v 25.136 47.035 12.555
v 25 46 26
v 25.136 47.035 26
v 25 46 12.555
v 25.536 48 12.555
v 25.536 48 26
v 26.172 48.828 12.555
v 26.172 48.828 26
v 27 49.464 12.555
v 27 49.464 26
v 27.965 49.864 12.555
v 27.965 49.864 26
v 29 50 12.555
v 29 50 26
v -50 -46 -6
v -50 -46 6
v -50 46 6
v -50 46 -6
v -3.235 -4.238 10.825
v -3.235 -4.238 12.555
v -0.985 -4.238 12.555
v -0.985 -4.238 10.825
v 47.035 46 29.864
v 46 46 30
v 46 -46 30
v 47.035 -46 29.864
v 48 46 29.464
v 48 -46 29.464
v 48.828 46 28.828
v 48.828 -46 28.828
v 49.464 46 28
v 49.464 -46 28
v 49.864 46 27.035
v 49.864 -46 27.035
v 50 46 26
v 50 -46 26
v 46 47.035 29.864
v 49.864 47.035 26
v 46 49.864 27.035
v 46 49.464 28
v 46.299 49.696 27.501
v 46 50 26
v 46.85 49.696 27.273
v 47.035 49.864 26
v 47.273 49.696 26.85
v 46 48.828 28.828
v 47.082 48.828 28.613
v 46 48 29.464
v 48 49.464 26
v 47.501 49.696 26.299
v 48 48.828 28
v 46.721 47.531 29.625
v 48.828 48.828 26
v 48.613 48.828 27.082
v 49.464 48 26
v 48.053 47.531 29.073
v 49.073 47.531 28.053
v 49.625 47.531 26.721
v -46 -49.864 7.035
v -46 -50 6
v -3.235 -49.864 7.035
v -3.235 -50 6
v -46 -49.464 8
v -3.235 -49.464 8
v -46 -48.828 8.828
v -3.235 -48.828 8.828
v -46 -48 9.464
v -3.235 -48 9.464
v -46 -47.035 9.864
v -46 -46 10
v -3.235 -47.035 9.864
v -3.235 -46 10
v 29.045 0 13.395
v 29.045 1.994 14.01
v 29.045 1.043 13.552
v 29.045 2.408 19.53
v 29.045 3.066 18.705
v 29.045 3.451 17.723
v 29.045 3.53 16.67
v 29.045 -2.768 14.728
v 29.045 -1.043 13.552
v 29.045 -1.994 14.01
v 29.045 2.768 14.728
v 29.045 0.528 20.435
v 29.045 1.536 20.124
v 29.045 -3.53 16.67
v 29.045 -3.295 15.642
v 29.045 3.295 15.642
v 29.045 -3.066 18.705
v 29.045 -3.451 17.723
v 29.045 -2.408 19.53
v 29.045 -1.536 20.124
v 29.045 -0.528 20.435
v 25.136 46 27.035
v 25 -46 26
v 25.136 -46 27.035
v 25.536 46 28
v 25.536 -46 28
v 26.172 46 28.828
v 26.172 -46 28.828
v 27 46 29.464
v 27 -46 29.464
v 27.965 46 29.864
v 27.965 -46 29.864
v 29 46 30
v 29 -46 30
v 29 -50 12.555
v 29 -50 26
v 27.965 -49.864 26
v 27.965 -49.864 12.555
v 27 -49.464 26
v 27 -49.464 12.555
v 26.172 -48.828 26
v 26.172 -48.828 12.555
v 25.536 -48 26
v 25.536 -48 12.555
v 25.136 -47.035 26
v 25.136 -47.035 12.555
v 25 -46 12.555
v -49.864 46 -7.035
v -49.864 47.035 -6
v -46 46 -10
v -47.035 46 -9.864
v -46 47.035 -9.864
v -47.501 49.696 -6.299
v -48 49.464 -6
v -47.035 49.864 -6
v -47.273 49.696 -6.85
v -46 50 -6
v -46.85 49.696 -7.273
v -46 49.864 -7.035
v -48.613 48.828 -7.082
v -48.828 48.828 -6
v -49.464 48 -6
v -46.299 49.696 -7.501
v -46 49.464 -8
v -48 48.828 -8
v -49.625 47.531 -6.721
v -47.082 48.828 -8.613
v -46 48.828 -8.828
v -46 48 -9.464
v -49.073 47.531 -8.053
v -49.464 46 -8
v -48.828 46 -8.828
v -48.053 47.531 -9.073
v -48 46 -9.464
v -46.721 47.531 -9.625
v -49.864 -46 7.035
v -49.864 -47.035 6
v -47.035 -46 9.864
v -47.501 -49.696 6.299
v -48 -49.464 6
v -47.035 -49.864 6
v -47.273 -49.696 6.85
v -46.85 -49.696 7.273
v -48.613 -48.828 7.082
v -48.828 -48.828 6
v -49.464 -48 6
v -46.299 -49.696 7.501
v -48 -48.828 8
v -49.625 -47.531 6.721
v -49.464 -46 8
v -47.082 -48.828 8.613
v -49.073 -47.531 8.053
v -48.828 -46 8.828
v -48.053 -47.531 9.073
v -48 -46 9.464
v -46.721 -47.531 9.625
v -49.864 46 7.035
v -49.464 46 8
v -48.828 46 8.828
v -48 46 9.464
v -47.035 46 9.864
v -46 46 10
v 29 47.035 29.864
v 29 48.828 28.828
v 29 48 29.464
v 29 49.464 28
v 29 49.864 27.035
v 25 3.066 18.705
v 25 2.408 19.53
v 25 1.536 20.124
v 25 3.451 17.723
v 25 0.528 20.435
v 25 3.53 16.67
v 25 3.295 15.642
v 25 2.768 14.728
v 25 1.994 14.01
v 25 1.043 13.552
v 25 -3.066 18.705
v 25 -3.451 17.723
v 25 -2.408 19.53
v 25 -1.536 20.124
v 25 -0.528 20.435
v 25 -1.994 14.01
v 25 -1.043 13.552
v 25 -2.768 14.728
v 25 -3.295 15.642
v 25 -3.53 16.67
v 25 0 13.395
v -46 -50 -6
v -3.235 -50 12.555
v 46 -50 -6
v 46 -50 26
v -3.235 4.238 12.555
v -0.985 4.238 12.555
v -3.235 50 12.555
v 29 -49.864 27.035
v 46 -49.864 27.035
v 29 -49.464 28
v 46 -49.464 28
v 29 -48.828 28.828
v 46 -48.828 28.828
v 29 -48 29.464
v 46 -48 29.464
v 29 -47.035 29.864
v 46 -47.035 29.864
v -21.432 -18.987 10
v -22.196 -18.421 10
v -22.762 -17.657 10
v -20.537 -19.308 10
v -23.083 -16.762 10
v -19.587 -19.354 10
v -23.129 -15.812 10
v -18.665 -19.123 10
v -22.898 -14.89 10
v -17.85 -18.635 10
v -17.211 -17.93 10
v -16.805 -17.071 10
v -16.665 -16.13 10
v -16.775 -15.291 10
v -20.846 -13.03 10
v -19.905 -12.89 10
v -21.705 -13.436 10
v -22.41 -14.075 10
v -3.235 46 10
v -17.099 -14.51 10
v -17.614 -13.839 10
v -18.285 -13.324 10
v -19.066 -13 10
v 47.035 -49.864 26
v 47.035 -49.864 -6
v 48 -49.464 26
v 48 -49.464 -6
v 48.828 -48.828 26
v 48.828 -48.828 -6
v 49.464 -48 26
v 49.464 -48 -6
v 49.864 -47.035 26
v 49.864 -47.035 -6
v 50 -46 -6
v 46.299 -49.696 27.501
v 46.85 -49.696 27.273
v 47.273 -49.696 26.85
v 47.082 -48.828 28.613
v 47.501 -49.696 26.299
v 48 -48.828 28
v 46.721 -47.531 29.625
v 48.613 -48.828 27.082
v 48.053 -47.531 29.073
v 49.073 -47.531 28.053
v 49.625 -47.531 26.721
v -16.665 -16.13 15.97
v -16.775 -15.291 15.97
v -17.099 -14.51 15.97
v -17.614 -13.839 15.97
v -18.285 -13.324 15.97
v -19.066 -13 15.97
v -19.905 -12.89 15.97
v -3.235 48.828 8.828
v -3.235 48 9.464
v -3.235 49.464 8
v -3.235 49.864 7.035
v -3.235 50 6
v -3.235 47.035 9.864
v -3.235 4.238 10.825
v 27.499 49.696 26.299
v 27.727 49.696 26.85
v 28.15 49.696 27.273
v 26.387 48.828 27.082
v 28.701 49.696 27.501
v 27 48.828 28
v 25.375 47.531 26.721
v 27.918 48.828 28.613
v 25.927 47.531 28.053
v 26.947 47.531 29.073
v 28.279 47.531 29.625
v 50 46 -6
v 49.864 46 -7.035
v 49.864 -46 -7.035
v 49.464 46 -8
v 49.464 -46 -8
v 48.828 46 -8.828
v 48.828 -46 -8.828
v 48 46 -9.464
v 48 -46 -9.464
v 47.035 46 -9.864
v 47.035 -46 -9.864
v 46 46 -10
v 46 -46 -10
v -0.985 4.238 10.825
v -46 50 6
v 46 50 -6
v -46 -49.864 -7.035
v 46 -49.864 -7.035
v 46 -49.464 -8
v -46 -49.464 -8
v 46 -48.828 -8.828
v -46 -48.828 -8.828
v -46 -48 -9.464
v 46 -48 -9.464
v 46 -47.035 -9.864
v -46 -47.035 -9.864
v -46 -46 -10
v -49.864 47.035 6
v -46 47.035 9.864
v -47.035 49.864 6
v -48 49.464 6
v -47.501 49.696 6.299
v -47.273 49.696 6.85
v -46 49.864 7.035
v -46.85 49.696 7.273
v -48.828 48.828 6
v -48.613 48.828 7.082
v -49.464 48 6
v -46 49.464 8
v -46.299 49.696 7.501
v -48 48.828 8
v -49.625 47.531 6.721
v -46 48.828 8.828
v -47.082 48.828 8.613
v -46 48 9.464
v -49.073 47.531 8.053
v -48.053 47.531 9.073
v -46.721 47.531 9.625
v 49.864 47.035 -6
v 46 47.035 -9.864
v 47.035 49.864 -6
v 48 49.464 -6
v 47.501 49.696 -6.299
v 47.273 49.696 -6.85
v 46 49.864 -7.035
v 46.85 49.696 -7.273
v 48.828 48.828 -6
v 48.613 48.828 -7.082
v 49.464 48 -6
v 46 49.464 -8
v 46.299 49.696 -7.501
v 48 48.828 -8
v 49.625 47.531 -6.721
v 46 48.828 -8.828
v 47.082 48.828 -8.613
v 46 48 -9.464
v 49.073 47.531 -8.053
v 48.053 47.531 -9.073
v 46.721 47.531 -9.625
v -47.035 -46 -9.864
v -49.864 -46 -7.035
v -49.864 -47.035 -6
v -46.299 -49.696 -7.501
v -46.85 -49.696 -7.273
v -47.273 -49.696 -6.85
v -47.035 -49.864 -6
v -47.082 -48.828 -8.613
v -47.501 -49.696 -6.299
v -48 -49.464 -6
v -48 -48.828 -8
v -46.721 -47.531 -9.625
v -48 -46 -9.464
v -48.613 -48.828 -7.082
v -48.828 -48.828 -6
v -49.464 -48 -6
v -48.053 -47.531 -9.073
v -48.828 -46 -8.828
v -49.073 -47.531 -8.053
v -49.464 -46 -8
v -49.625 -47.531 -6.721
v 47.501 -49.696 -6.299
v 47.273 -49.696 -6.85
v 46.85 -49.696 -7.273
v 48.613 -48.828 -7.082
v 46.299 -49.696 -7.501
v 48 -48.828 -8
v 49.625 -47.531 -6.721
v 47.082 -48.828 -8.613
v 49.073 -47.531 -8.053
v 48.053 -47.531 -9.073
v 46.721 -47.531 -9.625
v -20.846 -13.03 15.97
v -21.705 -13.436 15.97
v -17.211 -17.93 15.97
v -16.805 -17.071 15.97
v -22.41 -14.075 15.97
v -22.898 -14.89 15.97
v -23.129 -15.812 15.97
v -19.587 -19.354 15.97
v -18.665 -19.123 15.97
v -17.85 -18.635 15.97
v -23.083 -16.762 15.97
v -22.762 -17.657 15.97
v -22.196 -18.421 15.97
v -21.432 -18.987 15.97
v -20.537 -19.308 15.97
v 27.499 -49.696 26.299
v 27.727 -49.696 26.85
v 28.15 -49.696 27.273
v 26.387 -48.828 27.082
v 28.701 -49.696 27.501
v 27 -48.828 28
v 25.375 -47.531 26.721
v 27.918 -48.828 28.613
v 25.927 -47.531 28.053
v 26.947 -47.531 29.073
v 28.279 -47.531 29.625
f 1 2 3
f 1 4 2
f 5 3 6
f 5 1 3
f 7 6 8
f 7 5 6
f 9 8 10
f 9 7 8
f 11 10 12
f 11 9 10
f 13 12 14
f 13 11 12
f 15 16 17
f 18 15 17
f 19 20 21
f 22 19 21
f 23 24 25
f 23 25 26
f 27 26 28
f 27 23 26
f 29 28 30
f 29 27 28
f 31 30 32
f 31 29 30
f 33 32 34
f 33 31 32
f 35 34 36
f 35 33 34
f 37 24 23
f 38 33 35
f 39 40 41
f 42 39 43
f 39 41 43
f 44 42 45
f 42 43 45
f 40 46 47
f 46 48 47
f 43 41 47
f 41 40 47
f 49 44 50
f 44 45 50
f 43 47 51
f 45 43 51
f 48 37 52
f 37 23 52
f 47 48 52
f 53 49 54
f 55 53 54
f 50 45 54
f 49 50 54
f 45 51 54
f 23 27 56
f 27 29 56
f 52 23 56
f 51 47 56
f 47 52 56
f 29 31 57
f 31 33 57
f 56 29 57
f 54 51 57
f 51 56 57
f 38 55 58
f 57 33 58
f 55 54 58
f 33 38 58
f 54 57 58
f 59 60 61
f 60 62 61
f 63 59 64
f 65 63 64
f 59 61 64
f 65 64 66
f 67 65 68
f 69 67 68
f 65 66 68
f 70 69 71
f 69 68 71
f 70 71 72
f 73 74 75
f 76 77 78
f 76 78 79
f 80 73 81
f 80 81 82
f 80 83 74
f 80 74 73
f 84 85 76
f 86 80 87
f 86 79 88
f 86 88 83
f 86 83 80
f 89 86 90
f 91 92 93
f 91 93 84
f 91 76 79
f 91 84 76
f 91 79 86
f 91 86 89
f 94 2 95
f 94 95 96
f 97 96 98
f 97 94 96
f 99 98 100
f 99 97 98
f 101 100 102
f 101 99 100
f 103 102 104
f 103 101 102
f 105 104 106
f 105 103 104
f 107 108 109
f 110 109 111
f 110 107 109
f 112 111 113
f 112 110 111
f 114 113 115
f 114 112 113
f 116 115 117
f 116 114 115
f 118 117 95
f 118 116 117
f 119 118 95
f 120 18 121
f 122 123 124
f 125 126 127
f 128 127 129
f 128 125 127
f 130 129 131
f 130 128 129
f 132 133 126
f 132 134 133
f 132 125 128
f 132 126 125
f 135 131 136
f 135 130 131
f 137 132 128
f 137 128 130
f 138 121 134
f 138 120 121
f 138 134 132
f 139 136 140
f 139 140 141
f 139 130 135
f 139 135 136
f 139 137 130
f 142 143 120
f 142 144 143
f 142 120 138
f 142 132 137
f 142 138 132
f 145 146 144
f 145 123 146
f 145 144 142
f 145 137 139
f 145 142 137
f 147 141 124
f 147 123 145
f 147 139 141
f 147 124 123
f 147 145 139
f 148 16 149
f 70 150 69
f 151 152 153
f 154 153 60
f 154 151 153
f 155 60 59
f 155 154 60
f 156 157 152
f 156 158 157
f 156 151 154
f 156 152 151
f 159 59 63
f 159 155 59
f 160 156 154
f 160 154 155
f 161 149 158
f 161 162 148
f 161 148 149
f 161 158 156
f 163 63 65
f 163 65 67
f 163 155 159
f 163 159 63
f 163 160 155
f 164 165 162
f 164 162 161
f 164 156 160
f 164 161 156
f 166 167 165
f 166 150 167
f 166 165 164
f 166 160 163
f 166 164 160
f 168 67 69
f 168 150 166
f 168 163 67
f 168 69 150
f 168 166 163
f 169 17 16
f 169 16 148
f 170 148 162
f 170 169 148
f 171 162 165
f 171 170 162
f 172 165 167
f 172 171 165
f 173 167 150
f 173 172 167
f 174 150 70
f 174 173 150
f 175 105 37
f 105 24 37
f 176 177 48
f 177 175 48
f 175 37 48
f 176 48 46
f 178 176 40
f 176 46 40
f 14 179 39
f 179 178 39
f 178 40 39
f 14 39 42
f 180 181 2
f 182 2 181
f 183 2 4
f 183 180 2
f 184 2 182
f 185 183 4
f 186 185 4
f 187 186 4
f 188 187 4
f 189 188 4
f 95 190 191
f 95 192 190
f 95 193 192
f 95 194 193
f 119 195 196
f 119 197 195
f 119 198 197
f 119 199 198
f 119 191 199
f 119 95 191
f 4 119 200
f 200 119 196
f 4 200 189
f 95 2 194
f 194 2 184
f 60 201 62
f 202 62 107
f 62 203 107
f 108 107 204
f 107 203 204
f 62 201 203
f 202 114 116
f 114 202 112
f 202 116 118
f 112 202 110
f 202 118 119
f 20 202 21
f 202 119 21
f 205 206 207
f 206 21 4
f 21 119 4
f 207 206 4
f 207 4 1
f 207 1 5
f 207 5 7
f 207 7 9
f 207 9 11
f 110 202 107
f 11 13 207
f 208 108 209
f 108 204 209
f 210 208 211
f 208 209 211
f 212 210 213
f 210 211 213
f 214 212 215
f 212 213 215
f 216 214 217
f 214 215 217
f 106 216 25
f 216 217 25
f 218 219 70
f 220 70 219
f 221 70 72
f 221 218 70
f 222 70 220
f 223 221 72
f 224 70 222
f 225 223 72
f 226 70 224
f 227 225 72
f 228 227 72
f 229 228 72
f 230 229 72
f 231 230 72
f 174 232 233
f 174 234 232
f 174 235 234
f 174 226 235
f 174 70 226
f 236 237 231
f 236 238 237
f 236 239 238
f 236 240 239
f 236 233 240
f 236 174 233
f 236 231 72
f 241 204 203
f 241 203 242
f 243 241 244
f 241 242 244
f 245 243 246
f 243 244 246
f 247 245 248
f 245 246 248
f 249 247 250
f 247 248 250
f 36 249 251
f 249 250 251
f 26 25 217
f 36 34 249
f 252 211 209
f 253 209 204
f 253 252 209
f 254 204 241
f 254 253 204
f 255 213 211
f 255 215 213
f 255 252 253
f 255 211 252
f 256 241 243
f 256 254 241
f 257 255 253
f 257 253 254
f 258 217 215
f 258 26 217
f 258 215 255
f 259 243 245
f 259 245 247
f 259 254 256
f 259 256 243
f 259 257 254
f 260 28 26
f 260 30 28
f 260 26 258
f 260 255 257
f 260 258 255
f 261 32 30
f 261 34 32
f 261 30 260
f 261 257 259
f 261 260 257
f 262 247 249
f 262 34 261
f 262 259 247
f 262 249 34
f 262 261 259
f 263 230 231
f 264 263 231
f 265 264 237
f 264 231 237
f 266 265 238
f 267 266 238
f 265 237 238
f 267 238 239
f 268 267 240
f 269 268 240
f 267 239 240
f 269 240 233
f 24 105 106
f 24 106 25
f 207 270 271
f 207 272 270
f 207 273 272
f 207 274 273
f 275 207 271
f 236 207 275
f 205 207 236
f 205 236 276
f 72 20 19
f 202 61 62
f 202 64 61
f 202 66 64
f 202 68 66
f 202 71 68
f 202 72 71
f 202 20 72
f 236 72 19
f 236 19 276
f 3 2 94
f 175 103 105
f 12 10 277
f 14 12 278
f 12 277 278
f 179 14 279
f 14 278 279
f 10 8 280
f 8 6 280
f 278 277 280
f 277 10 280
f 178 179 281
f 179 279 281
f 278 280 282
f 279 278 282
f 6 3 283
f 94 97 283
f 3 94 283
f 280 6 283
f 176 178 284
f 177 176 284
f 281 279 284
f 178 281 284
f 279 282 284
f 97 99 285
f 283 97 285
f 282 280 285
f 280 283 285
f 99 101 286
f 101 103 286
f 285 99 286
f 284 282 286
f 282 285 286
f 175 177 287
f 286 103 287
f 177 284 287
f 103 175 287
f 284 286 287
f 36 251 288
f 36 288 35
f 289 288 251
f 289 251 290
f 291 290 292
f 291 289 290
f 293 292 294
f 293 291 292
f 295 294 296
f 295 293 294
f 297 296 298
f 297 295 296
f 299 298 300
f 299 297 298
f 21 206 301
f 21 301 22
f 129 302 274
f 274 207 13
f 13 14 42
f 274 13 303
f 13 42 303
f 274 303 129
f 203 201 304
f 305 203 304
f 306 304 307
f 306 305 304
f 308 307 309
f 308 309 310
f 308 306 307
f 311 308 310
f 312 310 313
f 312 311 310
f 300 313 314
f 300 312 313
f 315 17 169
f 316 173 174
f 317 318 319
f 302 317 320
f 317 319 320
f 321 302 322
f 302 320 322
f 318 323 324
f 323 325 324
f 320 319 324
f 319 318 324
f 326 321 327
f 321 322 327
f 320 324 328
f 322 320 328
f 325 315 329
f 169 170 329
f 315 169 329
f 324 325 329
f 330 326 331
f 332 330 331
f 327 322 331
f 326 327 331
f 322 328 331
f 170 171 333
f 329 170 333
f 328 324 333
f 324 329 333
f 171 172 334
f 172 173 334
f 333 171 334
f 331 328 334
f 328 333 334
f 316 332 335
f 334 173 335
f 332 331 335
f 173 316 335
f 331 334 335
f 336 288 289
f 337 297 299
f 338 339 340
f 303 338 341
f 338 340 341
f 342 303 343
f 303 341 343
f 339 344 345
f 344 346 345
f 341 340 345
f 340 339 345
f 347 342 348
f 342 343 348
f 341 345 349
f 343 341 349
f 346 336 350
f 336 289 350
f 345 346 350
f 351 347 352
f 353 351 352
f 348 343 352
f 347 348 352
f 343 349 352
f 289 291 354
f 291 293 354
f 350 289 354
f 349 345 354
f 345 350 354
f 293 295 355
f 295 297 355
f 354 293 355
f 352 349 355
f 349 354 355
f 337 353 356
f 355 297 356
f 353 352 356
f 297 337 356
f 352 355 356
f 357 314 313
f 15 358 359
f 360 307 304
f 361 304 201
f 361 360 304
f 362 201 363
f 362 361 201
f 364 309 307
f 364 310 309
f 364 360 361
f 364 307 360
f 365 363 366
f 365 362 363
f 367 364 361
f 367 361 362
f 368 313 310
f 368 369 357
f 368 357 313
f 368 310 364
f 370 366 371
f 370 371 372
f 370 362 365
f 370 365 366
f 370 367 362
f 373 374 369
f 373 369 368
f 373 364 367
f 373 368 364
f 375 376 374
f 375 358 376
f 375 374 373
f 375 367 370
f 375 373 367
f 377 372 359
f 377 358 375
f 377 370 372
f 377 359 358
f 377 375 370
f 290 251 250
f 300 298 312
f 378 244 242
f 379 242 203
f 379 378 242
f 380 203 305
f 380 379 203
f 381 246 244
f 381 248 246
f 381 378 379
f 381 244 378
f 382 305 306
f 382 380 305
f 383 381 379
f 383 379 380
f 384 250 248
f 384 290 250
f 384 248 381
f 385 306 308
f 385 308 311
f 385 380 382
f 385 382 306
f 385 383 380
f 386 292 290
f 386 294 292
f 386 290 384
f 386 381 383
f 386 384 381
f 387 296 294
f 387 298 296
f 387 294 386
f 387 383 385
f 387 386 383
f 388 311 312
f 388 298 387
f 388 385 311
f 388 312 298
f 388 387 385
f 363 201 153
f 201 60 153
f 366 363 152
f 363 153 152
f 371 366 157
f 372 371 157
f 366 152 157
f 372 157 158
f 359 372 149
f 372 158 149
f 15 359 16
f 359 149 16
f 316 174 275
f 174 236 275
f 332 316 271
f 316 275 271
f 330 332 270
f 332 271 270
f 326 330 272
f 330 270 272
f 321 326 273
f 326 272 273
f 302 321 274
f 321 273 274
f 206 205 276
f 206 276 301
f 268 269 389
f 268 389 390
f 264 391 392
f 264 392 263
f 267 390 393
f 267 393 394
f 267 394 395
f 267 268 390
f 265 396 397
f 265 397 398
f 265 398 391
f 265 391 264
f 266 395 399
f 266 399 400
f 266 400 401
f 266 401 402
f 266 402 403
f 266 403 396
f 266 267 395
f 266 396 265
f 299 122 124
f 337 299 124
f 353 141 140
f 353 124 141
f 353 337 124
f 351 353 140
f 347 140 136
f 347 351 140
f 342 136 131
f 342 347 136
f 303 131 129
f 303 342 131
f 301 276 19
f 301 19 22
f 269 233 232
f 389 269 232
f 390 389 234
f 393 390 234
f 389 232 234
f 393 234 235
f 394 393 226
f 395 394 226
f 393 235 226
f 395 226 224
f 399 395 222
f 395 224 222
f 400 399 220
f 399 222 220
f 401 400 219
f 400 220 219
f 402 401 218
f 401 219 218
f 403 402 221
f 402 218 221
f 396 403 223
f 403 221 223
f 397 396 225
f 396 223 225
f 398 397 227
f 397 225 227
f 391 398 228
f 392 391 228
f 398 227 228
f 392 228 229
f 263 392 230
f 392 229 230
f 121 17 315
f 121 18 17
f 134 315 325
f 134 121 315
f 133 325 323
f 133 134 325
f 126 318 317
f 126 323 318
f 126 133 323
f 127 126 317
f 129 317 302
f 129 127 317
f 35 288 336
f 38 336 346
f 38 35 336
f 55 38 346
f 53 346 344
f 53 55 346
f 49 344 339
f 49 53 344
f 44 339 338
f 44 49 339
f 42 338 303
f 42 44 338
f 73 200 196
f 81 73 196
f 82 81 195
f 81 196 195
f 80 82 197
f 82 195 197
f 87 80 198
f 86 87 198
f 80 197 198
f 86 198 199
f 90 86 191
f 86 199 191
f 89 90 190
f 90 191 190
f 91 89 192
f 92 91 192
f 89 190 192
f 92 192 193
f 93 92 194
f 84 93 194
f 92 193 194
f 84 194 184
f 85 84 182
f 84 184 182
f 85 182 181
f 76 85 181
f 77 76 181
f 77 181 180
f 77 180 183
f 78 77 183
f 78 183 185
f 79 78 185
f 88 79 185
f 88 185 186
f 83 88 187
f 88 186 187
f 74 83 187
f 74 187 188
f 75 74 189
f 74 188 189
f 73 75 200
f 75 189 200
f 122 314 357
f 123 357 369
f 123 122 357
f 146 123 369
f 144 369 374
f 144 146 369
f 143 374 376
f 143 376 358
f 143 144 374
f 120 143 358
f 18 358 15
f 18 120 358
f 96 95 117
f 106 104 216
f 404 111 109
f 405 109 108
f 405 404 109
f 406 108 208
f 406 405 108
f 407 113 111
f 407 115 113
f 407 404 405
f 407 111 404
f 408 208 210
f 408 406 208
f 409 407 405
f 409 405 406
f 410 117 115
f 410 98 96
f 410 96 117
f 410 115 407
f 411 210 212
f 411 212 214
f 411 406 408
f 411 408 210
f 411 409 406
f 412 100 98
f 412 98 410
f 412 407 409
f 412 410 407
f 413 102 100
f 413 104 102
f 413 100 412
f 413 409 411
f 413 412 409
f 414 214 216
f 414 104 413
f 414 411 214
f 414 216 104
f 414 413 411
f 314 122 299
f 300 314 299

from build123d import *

# Parameters (mm, degrees)
F0_W      = 100
F0_H      = 100
F1_DEPTH  = 10
F3_W      = 25
F3_H      = 10.365
F4_DEPTH  = 100
F6_DEPTH  = 4.045
F7_DEPTH  = 28.235
F9_DEPTH  = 2.25
F11_DEPTH = 5.97
F12_R     = 4
F13_W     = 2.25
F13_H     = 8.4769393061
F14_DEPTH = 1.73


with BuildPart() as f1:
    # F0 (on Top) → F1 (new body, symmetric)
    with BuildSketch(Plane.XY):
        Rectangle(F0_W, F0_H)
    extrude(amount=F1_DEPTH, both=True)

    # F3 (on face) → F4 (join)
    with BuildSketch(Plane.XZ.offset(50)):
        Polygon((25, 10), (50, 10), (50, 19.635), (25, 19.635), (25, 16.095), (25, 12.555), align=None)
        with Locations((37.5, 24.8175)):
            Rectangle(F3_W, F3_H)
    extrude(amount=-F4_DEPTH)

    # F5 (on face) → F6 (cut)
    with BuildSketch(Plane(origin=(25, 0, 0), x_dir=(0, -1, 0), z_dir=(-1, 0, 0))):
        with BuildLine():
            ThreePointArc((3.54, 16.935), (-2.5031580054, 19.4381580054), (0, 13.395))
            ThreePointArc((0, 13.395), (2.5031580054, 14.4318419946), (3.54, 16.935))
        make_face()
    extrude(amount=-F6_DEPTH, mode=Mode.SUBTRACT)

    # F5 (on face) → F7 (join)
    with BuildSketch(Plane(origin=(25, 0, 0), x_dir=(0, -1, 0), z_dir=(-1, 0, 0))):
        Polygon((0, 10), (50, 10), (50, 11.715), (50, 12.555), (0, 12.555), align=None)
        Polygon((-50, 10), (0, 10), (0, 12.555), (-50, 12.555), (-50, 11.715), align=None)
    extrude(amount=F7_DEPTH)

    # F8 (on face) → F9 (cut)
    with BuildSketch(Plane(origin=(-3.235, 0, 0), x_dir=(0, -1, 0), z_dir=(-1, 0, 0))):
        with BuildLine():
            Line((0, 10.84), (0, 12.555))
            Line((0, 12.555), (-4.2384696531, 12.555))
            ThreePointArc((-4.2384696531, 12.555), (-2.286145774, 11.284994469), (0, 10.84))
        make_face()
        with BuildLine():
            Line((4.2384696531, 12.555), (0, 12.555))
            Line((0, 12.555), (0, 10.84))
            ThreePointArc((0, 10.84), (2.286145774, 11.284994469), (4.2384696531, 12.555))
        make_face()
    extrude(amount=-F9_DEPTH, mode=Mode.SUBTRACT)

    # F10 (on face) → F11 (join)
    with BuildSketch(Plane.XY.offset(10)):
        with BuildLine():
            ThreePointArc((-16.665, -16.13), (-17.613974029, -13.838974029), (-19.905, -12.89))
            ThreePointArc((-19.905, -12.89), (-22.196025971, -18.421025971), (-16.665, -16.13))
        make_face()
    extrude(amount=F11_DEPTH)

    # F12
    f12_edges = [f1.edges().sort_by_distance(p)[0] for p in [
        (25, 0, 30),
        (50, 0, 30),
        (-50, 0, 10),
        (-50, 0, -10),
        (50, 0, -10),
        (25, -50, 21.2775),
        (37.5, -50, 30),
        (50, -50, 10),
        (0, -50, -10),
        (-50, -50, 0),
        (-50, 50, 0),
        (-26.6175, 50, 10),
        (25, 50, 21.2775),
        (37.5, 50, 30),
        (50, 50, 10),
        (0, 50, -10),
        (-26.6175, -50, 10),
    ]]
    fillet(f12_edges, radius=F12_R)

    # F13 (on face) → F14 (cut)
    with BuildSketch(Plane.XY.offset(12.555)):
        with Locations((-2.11, 0)):
            Rectangle(F13_W, F13_H)
    extrude(amount=-F14_DEPTH, mode=Mode.SUBTRACT)


solid = f1.part
